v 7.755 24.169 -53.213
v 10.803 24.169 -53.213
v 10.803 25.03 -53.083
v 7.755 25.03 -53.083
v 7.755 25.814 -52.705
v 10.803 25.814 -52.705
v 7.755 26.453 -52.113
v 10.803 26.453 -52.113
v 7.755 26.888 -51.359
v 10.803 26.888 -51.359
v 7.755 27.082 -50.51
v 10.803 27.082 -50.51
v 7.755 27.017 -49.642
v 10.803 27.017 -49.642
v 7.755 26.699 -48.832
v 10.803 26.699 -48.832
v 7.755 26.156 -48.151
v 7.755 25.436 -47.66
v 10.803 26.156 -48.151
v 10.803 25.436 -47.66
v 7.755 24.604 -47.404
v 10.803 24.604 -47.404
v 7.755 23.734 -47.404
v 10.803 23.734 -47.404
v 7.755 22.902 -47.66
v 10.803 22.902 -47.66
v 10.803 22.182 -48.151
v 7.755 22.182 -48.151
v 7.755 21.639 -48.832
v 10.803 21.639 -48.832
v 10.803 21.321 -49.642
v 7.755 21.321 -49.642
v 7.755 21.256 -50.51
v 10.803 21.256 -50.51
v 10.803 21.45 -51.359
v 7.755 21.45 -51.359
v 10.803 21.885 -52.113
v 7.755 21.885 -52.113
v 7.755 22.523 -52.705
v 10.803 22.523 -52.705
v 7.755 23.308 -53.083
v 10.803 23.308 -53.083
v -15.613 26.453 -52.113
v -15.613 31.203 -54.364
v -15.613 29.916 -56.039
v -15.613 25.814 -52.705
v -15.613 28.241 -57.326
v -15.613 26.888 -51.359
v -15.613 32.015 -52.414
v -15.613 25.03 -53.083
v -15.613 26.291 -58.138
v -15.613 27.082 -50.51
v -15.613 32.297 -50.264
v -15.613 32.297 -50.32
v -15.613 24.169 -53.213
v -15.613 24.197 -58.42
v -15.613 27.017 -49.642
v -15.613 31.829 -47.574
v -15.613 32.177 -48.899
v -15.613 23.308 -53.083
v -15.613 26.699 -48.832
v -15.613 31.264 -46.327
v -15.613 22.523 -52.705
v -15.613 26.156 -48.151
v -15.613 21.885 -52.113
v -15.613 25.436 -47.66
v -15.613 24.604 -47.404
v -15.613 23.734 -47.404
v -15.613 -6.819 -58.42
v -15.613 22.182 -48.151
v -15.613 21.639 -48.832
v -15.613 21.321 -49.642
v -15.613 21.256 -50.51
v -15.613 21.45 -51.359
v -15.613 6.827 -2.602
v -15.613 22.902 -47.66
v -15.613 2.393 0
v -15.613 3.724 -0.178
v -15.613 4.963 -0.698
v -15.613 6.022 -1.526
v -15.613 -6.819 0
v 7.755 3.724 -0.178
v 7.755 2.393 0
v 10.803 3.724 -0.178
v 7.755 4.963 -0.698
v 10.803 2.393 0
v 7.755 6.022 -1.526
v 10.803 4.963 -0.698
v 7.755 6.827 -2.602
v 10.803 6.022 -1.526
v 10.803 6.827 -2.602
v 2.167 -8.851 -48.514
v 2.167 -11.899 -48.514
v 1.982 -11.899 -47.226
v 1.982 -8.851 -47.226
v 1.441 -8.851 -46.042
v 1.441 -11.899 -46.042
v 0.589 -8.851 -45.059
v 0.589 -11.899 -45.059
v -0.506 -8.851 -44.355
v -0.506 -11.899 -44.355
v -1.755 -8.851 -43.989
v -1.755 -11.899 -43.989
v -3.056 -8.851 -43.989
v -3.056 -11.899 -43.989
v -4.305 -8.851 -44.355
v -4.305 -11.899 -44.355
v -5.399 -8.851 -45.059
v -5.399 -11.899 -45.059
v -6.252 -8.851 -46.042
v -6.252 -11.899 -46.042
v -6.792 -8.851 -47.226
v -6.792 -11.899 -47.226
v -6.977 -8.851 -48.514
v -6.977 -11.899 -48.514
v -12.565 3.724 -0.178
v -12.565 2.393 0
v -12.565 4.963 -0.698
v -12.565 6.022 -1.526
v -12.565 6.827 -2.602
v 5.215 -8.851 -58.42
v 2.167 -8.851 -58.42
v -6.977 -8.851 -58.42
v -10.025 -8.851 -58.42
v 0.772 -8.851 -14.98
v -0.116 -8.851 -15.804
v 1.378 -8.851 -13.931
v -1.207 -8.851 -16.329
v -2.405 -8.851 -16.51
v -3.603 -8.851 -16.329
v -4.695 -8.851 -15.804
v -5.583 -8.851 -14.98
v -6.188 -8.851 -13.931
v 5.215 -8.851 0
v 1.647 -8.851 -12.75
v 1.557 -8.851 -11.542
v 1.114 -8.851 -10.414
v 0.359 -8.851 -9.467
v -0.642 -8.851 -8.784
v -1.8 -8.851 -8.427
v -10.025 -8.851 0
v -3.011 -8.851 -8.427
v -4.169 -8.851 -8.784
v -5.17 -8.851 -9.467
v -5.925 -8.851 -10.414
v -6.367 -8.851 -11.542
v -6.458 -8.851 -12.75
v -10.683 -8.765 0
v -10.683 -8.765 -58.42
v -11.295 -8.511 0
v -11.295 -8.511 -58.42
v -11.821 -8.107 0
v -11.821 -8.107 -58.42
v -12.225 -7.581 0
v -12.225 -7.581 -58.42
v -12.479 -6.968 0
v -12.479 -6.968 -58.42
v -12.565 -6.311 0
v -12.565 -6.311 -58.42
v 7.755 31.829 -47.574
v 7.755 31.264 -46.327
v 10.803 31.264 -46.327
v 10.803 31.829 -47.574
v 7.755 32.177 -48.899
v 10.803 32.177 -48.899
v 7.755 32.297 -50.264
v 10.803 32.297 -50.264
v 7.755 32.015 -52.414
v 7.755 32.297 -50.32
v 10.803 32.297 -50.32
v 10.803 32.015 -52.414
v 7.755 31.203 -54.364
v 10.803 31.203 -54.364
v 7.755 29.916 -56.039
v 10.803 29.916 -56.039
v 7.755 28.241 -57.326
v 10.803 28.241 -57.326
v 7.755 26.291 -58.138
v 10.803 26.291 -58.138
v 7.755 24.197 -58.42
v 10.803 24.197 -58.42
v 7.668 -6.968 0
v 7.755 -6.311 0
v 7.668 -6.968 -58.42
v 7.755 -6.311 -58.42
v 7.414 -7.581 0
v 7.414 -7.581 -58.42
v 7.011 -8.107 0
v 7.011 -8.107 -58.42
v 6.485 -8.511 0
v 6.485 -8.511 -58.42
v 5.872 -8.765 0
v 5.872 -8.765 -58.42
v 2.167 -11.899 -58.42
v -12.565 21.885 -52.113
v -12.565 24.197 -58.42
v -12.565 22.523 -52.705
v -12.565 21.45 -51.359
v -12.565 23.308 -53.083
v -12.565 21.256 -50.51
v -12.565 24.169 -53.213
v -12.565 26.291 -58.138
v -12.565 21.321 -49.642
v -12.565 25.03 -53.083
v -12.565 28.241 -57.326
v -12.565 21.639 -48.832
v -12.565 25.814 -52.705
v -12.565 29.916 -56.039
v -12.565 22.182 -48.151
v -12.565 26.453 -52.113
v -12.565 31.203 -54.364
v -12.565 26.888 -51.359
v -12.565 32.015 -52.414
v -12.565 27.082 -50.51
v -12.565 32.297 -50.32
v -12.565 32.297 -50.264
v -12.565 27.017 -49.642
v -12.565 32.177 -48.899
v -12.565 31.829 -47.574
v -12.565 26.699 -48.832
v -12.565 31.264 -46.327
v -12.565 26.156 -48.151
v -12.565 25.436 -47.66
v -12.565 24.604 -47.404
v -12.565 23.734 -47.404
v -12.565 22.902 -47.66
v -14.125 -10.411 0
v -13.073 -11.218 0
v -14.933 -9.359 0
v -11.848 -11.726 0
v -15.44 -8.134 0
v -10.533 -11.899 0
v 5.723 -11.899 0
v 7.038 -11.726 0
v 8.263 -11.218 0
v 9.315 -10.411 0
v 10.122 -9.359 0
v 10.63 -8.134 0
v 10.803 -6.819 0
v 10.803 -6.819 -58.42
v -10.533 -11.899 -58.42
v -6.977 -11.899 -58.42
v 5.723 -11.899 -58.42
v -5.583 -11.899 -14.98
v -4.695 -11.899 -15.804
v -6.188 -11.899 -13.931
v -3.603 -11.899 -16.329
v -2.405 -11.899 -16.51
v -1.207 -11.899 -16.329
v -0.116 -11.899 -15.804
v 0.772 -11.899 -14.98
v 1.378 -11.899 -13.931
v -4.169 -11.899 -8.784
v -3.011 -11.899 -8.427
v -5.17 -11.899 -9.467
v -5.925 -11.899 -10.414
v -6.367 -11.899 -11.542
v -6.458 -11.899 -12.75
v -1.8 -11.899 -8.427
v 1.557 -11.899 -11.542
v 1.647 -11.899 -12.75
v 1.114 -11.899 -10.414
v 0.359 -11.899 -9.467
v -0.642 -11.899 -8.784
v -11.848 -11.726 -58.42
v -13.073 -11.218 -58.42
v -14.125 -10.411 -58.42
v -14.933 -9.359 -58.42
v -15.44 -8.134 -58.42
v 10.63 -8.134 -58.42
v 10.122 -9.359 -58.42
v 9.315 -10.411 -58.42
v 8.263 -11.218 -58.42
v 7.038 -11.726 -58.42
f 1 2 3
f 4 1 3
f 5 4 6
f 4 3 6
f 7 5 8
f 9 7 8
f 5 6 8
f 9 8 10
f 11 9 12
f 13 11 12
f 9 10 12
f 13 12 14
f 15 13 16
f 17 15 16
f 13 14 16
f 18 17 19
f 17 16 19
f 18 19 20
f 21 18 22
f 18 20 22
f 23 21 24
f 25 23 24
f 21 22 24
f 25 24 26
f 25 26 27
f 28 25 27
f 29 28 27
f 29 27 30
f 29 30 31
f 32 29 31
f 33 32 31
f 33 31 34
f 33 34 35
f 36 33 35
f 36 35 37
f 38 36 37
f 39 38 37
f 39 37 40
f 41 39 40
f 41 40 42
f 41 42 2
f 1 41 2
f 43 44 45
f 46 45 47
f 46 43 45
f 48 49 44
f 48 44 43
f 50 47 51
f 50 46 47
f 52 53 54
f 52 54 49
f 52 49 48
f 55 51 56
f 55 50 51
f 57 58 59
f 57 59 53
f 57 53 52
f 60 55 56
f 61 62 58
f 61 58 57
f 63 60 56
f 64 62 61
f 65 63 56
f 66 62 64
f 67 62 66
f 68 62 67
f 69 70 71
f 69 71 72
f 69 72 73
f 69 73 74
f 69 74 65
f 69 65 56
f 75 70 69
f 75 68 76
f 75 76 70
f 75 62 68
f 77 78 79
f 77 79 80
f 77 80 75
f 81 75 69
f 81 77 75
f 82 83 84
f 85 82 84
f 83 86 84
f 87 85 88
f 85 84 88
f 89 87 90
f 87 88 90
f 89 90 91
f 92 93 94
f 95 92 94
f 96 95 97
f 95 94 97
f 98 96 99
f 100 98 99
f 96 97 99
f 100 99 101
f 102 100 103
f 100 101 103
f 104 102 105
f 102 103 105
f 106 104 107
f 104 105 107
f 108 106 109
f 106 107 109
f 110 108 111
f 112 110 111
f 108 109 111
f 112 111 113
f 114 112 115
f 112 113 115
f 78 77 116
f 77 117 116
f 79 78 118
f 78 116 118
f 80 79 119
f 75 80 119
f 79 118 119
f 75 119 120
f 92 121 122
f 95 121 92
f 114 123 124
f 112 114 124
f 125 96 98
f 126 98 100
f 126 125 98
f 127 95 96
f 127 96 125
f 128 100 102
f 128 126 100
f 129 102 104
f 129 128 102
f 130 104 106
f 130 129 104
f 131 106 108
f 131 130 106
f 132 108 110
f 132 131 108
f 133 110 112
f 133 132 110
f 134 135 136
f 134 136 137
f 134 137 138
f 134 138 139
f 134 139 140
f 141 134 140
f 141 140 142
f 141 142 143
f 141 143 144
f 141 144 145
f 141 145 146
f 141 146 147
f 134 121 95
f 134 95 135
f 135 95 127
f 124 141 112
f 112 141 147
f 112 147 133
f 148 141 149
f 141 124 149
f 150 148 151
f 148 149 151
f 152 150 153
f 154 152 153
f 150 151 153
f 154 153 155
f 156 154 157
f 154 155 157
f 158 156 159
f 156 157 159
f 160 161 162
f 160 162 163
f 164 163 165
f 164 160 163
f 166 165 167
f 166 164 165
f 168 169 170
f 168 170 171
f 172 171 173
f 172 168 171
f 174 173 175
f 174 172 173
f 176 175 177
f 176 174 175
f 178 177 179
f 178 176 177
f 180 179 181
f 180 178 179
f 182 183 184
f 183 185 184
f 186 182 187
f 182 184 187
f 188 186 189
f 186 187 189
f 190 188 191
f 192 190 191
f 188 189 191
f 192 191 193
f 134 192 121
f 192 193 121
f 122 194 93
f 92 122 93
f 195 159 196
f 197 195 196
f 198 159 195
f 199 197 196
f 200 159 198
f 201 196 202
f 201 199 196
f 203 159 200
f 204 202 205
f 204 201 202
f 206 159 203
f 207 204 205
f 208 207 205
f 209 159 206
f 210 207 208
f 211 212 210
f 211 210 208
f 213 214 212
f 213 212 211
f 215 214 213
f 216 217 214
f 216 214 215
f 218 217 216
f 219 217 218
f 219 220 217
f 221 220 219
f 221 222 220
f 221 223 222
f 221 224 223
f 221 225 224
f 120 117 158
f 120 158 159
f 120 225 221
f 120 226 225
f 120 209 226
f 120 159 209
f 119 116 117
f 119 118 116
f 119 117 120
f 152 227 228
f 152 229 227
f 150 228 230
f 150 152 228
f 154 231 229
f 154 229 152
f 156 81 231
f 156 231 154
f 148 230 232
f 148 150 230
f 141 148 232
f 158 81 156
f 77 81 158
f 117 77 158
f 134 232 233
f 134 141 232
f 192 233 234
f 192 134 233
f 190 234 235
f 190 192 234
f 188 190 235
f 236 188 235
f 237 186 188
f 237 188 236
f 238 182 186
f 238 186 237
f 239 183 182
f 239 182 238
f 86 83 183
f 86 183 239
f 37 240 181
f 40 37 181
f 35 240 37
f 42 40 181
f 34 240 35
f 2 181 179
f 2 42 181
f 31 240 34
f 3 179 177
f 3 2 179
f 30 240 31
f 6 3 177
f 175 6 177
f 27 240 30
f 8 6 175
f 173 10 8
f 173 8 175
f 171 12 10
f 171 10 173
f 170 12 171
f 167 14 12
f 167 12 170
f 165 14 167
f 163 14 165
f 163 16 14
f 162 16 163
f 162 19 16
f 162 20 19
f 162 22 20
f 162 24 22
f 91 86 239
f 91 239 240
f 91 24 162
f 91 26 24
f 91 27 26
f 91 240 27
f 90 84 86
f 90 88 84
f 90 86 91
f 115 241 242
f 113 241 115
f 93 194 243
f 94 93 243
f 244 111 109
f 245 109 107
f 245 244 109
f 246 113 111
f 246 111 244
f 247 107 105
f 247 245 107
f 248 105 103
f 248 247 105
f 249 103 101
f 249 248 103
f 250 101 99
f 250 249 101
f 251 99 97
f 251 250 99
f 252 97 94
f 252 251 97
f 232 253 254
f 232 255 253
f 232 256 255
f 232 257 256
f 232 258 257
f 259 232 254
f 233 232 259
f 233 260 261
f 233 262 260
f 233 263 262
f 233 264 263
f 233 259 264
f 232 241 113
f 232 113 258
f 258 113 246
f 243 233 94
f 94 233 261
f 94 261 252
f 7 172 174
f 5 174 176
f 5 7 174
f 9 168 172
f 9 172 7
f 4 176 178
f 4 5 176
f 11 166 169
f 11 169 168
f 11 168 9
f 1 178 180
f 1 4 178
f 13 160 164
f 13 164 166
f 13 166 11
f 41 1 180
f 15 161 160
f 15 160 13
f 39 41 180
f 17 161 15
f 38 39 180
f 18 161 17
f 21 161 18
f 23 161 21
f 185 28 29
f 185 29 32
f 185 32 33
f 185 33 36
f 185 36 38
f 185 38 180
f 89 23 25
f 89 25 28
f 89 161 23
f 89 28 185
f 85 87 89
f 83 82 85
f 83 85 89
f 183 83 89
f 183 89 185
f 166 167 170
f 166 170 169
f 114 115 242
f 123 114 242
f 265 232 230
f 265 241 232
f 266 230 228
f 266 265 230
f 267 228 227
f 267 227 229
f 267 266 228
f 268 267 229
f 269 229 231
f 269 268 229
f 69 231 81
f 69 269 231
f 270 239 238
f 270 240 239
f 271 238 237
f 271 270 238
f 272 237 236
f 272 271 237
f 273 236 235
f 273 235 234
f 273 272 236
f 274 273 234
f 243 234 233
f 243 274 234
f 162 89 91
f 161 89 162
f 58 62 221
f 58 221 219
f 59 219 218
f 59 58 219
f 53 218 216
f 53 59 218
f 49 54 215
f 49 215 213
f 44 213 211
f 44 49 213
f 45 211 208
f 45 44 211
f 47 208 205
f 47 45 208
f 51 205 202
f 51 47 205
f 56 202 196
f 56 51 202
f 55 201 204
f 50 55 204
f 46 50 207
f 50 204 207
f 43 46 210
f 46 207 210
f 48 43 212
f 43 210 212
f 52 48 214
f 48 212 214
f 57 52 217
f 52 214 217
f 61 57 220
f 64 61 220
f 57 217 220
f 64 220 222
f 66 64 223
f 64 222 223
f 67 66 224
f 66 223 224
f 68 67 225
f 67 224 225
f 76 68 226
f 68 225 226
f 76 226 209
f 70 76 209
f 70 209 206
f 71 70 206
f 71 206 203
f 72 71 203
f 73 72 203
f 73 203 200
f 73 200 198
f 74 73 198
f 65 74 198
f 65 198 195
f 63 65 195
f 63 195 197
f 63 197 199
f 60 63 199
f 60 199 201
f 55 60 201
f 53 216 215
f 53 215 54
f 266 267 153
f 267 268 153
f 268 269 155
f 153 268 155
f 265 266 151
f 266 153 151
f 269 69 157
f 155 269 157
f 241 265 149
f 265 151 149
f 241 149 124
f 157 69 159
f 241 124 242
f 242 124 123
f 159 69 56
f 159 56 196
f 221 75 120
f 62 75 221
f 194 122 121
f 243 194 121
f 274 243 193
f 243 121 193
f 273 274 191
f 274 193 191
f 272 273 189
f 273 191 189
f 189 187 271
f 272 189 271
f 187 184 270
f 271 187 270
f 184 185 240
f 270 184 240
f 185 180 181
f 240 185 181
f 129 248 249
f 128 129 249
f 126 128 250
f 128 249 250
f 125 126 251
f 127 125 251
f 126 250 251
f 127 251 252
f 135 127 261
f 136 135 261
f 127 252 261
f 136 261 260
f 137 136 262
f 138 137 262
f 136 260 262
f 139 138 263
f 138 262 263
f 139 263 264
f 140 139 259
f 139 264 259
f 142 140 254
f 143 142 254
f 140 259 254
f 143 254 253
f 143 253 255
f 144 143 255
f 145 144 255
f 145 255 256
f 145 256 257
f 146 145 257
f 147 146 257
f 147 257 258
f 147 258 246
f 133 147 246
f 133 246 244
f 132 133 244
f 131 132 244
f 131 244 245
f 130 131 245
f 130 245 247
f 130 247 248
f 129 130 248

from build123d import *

# Parameters (mm, degrees)
BOSS_EXTRUDE1_DEPTH = 58.42
FILLET1_R           = 2.54
FILLET2_R           = 5.08
CUT_EXTRUDE1_START  = -26.416
CUT_EXTRUDE1_DEPTH  = 26.416
CUT_EXTRUDE2_START  = -26.416
CUT_EXTRUDE2_DEPTH  = 26.416
SKETCH2_5_R         = 2.921
CUT_EXTRUDE3_DEPTH  = 58.42
FILLET3_R           = 5.08
SKETCH4_R           = 4.064
CUT_EXTRUDE4_DEPTH  = 58.42


# Read off the part's stored shape, not the designer's step: Cut-Extrude1, Cut-Extrude2
with BuildPart() as part:
    # Sketch1 → Boss-Extrude1 (new body)
    with BuildSketch(Plane.XY):
        Polygon((-15.613299977, -11.899049236), (10.802700023, -11.899049236), (10.802700023, 32.296950764), (7.754700023, 32.296950764), (7.754700023, -8.851049236), (-12.565299977, -8.851049236), (-12.565299977, 32.296950764), (-15.613299977, 32.296950764), align=None)
    extrude(amount=-BOSS_EXTRUDE1_DEPTH)

    # Fillet1
    fillet1_edges = [part.edges().sort_by_distance(p)[0] for p in [
        (-12.565299977, -8.851049236, -29.21),
        (7.754700023, -8.851049236, -29.21),
    ]]
    fillet(fillet1_edges, radius=FILLET1_R)

    # Fillet2
    fillet2_edges = [part.edges().sort_by_distance(p)[0] for p in [
        (10.802700023, -11.899049236, -29.21),
        (-15.613299977, -11.899049236, -29.21),
    ]]
    fillet(fillet2_edges, radius=FILLET2_R)

    # Cut-Extrude1 outline → Cut-Extrude1 (cut)
    with BuildSketch(Plane(origin=(10.802700023, 0, 0), x_dir=(0, 0, -1), z_dir=(1, 0, 0)).offset(CUT_EXTRUDE1_START)):
        with BuildLine():
            Line((0, 32.296950764), (0, 5.372950764))
            Line((0, 5.372950764), (46.326645987, 31.26409951))
            ThreePointArc((46.326645987, 31.26409951), (48.229617736, 32.030995509), (50.263996941, 32.296950764))
            Line((50.263996941, 32.296950764), (0, 32.296950764))
        make_face()
    extrude(amount=CUT_EXTRUDE1_DEPTH, mode=Mode.SUBTRACT)

    # Cut-Extrude2 outline → Cut-Extrude2 (cut)
    with BuildSketch(Plane(origin=(10.802700023, 0, 0), x_dir=(0, 0, -1), z_dir=(1, 0, 0)).offset(CUT_EXTRUDE2_START)):
        with BuildLine():
            ThreePointArc((50.320003059, 32.296950764), (56.039398027, 29.916348791), (58.42, 24.196953823))
            Line((58.42, 24.196953823), (58.42, 32.296950764))
            Line((58.42, 32.296950764), (50.320003059, 32.296950764))
        make_face()
    extrude(amount=CUT_EXTRUDE2_DEPTH, mode=Mode.SUBTRACT)

    # Sketch2<5> → Cut-Extrude3 (cut)
    with BuildSketch(Plane(origin=(10.802700023, 0, 0), x_dir=(0, 0, -1), z_dir=(1, 0, 0))):
        with Locations((50.292, 24.168950764)):
            Circle(SKETCH2_5_R)
    extrude(amount=-CUT_EXTRUDE3_DEPTH, mode=Mode.SUBTRACT)

    # Fillet3
    fillet3_edges = [part.edges().sort_by_distance(p)[0] for p in [
        (-14.089299977, 5.372950764, 0),
        (9.278700023, 5.372950764, 0),
    ]]
    fillet(fillet3_edges, radius=FILLET3_R)

    # Sketch4 → Cut-Extrude4 (cut)
    with BuildSketch(Plane(origin=(0, -11.899049236, 0), x_dir=(-1, 0, 0), z_dir=(0, -1, 0))):
        with Locations(Location((2.405299977, 12.446, 0), (0, 0, 90))):
            Circle(SKETCH4_R)
        with BuildLine():
            ThreePointArc((-2.166700023, 48.514), (2.405299977, 43.942), (6.977299977, 48.514))
            Line((6.977299977, 48.514), (6.977299977, 58.42))
            Line((6.977299977, 58.42), (-2.166700023, 58.42))
            Line((-2.166700023, 58.42), (-2.166700023, 48.514))
        make_face()
    extrude(amount=-CUT_EXTRUDE4_DEPTH, mode=Mode.SUBTRACT)


solid = part.part
